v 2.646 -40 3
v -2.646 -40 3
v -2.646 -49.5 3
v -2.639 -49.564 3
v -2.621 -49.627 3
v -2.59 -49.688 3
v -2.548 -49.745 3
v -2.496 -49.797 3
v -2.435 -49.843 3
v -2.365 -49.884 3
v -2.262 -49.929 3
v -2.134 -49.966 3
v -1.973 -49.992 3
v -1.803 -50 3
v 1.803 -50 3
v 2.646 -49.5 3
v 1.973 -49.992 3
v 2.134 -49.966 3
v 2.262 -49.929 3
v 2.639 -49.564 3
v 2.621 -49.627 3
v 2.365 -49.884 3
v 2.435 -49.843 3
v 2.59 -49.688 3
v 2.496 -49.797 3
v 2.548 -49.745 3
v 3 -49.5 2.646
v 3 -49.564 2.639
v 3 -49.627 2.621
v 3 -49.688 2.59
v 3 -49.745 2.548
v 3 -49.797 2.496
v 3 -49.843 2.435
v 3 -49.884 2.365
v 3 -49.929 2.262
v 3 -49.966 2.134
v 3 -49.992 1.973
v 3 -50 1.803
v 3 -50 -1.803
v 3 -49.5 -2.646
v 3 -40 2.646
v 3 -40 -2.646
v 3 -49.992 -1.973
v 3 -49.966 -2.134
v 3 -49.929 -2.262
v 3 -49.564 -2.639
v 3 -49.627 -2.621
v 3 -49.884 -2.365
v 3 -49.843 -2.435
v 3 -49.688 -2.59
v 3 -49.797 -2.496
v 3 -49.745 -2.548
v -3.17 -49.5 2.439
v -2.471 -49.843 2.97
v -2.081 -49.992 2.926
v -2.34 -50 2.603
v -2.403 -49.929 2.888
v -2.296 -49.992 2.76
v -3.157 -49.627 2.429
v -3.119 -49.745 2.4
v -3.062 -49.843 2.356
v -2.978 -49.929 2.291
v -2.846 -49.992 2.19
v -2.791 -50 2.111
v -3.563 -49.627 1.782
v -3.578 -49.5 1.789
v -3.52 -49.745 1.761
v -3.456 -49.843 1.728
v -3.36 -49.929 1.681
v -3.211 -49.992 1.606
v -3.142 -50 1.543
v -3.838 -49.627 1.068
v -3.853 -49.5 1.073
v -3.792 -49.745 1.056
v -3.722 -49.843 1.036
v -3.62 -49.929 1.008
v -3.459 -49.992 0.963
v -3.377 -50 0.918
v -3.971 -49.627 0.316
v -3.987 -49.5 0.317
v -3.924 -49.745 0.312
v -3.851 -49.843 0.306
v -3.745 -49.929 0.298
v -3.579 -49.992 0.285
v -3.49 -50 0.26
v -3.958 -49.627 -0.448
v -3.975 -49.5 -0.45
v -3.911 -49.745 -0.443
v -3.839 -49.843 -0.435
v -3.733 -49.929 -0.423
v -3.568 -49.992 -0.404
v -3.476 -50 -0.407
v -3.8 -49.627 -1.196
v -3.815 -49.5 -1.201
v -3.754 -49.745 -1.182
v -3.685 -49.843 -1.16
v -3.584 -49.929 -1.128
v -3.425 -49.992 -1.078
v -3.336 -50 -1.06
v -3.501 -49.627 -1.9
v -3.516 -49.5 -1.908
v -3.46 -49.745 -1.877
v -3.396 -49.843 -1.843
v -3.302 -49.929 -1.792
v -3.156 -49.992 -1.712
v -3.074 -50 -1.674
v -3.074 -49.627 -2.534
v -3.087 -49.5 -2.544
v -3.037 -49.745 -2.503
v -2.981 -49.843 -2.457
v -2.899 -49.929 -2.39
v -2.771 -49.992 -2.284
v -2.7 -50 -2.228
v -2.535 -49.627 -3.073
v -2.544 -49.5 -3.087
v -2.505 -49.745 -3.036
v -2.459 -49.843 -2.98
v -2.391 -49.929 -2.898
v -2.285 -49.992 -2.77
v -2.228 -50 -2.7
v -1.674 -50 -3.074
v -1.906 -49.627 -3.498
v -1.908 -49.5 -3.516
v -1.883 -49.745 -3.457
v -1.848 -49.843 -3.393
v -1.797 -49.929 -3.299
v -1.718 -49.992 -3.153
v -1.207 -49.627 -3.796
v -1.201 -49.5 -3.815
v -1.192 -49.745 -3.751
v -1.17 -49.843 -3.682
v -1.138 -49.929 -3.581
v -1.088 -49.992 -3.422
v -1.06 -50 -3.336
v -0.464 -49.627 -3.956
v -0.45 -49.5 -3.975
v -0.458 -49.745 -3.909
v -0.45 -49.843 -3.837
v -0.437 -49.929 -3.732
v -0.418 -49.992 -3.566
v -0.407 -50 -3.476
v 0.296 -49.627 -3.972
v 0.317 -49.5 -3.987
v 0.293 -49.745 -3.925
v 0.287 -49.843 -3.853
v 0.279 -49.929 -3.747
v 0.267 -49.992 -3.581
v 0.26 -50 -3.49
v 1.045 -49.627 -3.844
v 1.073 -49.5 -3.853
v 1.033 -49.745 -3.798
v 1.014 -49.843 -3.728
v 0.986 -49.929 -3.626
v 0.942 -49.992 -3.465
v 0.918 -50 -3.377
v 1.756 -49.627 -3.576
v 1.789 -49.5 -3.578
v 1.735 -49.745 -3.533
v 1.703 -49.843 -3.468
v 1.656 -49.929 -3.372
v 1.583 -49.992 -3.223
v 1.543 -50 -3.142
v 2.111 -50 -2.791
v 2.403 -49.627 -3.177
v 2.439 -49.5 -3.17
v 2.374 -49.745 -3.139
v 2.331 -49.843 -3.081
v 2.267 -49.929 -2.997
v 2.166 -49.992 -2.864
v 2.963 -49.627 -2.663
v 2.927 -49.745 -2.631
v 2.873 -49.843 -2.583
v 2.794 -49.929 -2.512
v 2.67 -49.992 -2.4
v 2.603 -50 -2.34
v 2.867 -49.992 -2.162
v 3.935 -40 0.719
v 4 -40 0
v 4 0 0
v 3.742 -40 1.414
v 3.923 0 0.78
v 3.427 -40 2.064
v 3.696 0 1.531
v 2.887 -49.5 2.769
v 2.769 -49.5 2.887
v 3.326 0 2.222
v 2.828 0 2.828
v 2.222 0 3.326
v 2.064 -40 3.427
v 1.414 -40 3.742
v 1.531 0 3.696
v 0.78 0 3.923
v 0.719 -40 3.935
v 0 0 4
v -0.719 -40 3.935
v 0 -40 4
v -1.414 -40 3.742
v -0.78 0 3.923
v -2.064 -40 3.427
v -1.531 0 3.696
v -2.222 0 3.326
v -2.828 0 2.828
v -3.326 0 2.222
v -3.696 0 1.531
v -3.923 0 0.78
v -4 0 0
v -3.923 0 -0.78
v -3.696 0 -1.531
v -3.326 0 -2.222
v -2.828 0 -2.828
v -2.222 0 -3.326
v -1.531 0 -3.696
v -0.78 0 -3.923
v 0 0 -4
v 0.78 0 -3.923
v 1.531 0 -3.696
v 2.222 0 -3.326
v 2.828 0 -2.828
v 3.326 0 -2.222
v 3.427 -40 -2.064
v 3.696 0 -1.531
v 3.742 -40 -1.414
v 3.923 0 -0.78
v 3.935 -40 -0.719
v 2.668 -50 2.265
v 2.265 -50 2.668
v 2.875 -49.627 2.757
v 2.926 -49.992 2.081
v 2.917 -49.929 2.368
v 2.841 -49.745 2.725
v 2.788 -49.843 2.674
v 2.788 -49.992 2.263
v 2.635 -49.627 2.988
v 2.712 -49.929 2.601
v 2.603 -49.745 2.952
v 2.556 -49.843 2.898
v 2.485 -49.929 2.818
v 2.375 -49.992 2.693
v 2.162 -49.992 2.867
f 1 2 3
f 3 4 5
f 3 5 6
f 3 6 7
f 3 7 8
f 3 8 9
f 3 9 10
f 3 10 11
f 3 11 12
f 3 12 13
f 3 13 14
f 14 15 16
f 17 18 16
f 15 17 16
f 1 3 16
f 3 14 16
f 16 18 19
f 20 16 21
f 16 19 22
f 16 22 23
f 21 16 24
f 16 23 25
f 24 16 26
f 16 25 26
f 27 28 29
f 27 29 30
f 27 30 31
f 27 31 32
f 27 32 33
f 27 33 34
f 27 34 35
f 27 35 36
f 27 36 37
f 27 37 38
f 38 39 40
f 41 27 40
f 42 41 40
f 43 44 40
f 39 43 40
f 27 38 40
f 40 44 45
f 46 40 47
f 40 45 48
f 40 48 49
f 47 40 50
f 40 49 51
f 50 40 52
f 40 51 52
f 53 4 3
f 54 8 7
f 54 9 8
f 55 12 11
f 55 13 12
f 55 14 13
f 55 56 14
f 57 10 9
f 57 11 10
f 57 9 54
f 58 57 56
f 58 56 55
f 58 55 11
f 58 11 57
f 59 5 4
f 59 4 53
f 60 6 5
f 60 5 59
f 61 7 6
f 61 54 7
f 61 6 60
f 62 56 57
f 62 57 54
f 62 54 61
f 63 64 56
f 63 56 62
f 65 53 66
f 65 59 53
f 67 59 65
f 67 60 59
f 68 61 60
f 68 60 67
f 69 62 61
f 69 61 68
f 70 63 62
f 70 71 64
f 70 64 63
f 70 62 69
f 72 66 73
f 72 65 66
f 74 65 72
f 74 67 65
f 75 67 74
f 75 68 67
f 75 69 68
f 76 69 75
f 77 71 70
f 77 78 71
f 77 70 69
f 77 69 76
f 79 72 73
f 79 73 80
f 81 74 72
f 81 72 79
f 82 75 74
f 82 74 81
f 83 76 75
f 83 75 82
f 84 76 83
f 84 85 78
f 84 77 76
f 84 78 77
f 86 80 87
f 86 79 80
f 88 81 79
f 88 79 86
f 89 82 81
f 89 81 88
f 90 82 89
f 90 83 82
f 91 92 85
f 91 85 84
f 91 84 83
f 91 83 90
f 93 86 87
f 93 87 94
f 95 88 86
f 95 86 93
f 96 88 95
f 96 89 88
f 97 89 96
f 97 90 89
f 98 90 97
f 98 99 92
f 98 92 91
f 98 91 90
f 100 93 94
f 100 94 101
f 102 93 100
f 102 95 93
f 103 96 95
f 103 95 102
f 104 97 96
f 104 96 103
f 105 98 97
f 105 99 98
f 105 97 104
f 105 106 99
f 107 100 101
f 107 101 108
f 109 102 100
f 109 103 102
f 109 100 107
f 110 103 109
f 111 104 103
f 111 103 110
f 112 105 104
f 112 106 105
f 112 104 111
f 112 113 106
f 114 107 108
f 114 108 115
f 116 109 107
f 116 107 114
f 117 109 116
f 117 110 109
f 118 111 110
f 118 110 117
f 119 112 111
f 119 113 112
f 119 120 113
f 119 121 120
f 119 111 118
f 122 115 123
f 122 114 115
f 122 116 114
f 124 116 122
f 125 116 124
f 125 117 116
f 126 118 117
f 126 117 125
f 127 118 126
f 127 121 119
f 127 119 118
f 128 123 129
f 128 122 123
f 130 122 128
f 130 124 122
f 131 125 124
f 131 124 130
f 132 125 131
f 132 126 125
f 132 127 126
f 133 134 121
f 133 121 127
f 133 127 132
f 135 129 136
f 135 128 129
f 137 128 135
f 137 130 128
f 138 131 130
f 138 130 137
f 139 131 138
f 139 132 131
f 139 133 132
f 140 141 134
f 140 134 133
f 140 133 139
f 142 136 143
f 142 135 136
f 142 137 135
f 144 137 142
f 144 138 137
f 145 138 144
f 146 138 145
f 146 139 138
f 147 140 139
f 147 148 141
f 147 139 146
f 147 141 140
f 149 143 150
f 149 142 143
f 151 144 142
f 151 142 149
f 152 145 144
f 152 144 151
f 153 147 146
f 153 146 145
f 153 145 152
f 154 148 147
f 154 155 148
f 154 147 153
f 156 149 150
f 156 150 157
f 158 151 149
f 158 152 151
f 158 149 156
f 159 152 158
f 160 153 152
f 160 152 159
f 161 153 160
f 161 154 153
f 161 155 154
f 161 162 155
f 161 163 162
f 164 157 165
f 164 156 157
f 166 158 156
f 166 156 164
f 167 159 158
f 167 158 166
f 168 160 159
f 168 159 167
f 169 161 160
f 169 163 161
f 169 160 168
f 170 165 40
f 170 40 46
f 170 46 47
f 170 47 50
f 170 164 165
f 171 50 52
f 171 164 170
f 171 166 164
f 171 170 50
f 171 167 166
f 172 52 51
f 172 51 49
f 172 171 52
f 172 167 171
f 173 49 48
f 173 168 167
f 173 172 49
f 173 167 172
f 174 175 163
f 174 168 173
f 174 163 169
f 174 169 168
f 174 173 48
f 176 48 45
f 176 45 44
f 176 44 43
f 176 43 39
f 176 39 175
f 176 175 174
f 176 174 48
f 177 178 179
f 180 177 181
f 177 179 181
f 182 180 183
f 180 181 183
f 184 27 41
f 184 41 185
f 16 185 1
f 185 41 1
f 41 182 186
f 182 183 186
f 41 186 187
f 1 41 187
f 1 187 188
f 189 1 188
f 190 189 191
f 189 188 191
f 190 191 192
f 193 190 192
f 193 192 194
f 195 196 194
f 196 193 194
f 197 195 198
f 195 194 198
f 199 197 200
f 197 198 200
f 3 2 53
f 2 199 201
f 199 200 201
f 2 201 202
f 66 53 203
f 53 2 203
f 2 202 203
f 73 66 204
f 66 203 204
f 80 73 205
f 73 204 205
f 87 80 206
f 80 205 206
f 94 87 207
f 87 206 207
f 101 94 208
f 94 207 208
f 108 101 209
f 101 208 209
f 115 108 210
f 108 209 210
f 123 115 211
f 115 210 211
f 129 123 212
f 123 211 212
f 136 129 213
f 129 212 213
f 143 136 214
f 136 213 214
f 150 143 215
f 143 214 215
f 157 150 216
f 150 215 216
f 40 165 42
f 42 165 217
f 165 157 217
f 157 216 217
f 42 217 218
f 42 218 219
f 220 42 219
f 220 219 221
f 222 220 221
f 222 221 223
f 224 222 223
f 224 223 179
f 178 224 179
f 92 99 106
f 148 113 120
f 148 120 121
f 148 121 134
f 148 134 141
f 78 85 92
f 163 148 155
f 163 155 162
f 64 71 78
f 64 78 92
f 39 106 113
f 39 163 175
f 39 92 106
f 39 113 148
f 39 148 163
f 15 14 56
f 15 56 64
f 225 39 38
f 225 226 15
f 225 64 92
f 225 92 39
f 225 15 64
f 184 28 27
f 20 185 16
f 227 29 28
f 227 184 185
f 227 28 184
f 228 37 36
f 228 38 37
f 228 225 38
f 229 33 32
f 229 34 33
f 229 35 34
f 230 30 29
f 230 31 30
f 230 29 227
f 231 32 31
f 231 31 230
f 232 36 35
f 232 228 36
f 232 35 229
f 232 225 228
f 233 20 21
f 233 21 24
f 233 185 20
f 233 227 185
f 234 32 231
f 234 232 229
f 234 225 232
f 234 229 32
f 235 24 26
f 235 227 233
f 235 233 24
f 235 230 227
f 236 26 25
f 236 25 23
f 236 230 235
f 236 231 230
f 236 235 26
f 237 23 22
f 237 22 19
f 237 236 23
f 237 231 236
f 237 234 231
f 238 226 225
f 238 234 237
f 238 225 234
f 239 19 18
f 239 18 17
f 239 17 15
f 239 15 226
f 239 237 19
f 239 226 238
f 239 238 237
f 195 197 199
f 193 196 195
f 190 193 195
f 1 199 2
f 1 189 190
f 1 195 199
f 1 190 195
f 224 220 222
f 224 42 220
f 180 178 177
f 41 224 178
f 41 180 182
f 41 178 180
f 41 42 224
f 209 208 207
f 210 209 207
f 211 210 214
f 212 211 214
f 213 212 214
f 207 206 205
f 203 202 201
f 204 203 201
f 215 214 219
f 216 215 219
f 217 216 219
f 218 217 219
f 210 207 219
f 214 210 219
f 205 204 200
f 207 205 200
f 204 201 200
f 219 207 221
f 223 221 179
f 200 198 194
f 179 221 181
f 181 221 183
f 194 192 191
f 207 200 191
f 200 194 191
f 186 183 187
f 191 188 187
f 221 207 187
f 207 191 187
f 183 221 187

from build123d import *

# Parameters (mm, degrees)
F0_R     = 4
F1_DEPTH = 50
F2_W     = 1
F2_H     = 1
F3_DEPTH = 10
F4_R     = 0.5


with BuildPart() as f1:
    # F0 (on Front) → F1 (new body)
    with BuildSketch(Plane.XZ):
        Circle(F0_R)
    extrude(amount=F1_DEPTH)

    # F2 (on face) → F3 (cut)
    with BuildSketch(Plane.XZ.offset(50)):
        with BuildLine():
            Line((2.6457513111, 3), (3, 3))
            Line((3, 3), (3, 4))
            Line((3, 4), (0, 4))
            ThreePointArc((0, 4), (1.4142135624, 3.7416573868), (2.6457513111, 3))
        make_face()
        with Locations((3.5, 3.5)):
            Rectangle(F2_W, F2_H)
        with BuildLine():
            Line((-4, 3), (-2.6457513111, 3))
            ThreePointArc((-2.6457513111, 3), (-1.4142135624, 3.7416573868), (0, 4))
            Line((0, 4), (-4, 4))
            Line((-4, 4), (-4, 3))
        make_face()
        with BuildLine():
            Line((4, 0), (4, 3))
            Line((4, 3), (3, 3))
            Line((3, 3), (3, 2.6457513111))
            ThreePointArc((3, 2.6457513111), (3.7416573868, 1.4142135624), (4, 0))
        make_face()
        with BuildLine():
            Line((4, -4), (4, 0))
            ThreePointArc((4, 0), (3.7416573868, -1.4142135624), (3, -2.6457513111))
            Line((3, -2.6457513111), (3, -4))
            Line((3, -4), (4, -4))
        make_face()
        with BuildLine():
            Line((-2.6457513111, 3), (2.6457513111, 3))
            ThreePointArc((2.6457513111, 3), (1.4142135624, 3.7416573868), (0, 4))
            ThreePointArc((0, 4), (-1.4142135624, 3.7416573868), (-2.6457513111, 3))
        make_face()
        with BuildLine():
            ThreePointArc((3, -2.6457513111), (3.7416573868, -1.4142135624), (4, 0))
            ThreePointArc((4, 0), (3.7416573868, 1.4142135624), (3, 2.6457513111))
            Line((3, 2.6457513111), (3, -2.6457513111))
        make_face()
    extrude(amount=-F3_DEPTH, mode=Mode.SUBTRACT)

    # F4
    f4_edges = [f1.edges().sort_by_distance(p)[0] for p in [
        (2.828427, -50, 2.828427),
        (-2.828427, -50, -2.828427),
    ]]
    fillet(f4_edges, radius=F4_R)


solid = f1.part
